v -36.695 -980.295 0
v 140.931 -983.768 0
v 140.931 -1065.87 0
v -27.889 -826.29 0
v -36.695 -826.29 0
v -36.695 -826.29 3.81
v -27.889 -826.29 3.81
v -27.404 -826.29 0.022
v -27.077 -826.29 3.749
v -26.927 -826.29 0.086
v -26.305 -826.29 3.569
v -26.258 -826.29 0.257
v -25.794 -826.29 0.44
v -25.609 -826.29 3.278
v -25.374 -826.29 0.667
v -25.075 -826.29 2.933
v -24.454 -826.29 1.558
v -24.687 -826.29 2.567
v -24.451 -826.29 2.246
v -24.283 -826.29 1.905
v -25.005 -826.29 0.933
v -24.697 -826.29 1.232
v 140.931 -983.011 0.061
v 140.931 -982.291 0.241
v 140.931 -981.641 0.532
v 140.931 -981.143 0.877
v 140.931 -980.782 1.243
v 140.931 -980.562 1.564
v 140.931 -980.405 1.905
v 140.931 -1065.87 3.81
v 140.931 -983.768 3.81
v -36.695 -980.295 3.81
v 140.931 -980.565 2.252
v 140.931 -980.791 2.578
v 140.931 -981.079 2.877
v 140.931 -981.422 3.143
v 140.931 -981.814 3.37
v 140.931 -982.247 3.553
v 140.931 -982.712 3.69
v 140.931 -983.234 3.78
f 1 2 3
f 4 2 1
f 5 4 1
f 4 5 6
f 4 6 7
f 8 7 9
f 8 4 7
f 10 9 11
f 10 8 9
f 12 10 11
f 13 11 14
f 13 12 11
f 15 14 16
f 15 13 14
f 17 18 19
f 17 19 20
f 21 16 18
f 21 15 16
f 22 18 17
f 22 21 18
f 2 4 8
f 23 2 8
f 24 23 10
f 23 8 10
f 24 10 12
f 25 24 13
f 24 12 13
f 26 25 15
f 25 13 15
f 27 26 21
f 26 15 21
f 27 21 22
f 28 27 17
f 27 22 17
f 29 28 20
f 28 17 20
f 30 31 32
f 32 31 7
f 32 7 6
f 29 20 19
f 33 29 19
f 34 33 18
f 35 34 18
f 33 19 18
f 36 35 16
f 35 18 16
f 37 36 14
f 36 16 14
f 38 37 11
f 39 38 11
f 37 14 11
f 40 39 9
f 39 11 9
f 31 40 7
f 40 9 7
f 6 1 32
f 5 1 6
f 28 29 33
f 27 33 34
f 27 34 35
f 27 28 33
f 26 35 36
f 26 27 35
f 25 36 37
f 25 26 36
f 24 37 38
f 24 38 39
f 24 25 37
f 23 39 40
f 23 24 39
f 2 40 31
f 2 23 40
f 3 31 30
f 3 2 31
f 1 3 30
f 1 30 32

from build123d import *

# Parameters (mm, degrees)
BOSS_EXTRUDE1_DEPTH = 3.81
FILLET1_R           = 2.54


with BuildPart() as part:
    # Sketch2 → Boss-Extrude1 (new body)
    with BuildSketch(Plane.XY):
        Polygon((-24.165117367, -826.289827771), (140.930897986, -980.294891713), (140.930897986, -1065.870274418), (-36.694836072, -980.294891713), (-36.694836072, -826.289827771), align=None)
    extrude(amount=BOSS_EXTRUDE1_DEPTH)

    # Fillet1
    # the kernel refuses this fillet: 2.54 mm, written as the material it takes off along each edge
    with BuildSketch(Plane(origin=(-28.808504328, -821.958377953, 3.81), x_dir=(0, 0, -1), z_dir=(0.7312420410589273, -0.6821180817043146, 0))) as fillet1_piece_1:
        with BuildLine():
            CenterArc((FILLET1_R, -FILLET1_R), FILLET1_R, 90, 90)
            Line((0, -FILLET1_R), (0, 0))
            Line((0, 0), (FILLET1_R, 0))
        make_face()
    extrude(amount=238.474786026, mode=Mode.SUBTRACT)
    with BuildSketch(Plane(origin=(-28.808504328, -821.958377953, 0), x_dir=(0, 0, 1), z_dir=(0.7312420410589273, -0.6821180817043146, 0))) as fillet1_piece_2:
        with BuildLine():
            CenterArc((FILLET1_R, FILLET1_R), FILLET1_R, 180, 90)
            Line((0, FILLET1_R), (0, 0))
            Line((0, 0), (FILLET1_R, 0))
        make_face()
    extrude(amount=238.474786026, mode=Mode.SUBTRACT)


solid = part.part
